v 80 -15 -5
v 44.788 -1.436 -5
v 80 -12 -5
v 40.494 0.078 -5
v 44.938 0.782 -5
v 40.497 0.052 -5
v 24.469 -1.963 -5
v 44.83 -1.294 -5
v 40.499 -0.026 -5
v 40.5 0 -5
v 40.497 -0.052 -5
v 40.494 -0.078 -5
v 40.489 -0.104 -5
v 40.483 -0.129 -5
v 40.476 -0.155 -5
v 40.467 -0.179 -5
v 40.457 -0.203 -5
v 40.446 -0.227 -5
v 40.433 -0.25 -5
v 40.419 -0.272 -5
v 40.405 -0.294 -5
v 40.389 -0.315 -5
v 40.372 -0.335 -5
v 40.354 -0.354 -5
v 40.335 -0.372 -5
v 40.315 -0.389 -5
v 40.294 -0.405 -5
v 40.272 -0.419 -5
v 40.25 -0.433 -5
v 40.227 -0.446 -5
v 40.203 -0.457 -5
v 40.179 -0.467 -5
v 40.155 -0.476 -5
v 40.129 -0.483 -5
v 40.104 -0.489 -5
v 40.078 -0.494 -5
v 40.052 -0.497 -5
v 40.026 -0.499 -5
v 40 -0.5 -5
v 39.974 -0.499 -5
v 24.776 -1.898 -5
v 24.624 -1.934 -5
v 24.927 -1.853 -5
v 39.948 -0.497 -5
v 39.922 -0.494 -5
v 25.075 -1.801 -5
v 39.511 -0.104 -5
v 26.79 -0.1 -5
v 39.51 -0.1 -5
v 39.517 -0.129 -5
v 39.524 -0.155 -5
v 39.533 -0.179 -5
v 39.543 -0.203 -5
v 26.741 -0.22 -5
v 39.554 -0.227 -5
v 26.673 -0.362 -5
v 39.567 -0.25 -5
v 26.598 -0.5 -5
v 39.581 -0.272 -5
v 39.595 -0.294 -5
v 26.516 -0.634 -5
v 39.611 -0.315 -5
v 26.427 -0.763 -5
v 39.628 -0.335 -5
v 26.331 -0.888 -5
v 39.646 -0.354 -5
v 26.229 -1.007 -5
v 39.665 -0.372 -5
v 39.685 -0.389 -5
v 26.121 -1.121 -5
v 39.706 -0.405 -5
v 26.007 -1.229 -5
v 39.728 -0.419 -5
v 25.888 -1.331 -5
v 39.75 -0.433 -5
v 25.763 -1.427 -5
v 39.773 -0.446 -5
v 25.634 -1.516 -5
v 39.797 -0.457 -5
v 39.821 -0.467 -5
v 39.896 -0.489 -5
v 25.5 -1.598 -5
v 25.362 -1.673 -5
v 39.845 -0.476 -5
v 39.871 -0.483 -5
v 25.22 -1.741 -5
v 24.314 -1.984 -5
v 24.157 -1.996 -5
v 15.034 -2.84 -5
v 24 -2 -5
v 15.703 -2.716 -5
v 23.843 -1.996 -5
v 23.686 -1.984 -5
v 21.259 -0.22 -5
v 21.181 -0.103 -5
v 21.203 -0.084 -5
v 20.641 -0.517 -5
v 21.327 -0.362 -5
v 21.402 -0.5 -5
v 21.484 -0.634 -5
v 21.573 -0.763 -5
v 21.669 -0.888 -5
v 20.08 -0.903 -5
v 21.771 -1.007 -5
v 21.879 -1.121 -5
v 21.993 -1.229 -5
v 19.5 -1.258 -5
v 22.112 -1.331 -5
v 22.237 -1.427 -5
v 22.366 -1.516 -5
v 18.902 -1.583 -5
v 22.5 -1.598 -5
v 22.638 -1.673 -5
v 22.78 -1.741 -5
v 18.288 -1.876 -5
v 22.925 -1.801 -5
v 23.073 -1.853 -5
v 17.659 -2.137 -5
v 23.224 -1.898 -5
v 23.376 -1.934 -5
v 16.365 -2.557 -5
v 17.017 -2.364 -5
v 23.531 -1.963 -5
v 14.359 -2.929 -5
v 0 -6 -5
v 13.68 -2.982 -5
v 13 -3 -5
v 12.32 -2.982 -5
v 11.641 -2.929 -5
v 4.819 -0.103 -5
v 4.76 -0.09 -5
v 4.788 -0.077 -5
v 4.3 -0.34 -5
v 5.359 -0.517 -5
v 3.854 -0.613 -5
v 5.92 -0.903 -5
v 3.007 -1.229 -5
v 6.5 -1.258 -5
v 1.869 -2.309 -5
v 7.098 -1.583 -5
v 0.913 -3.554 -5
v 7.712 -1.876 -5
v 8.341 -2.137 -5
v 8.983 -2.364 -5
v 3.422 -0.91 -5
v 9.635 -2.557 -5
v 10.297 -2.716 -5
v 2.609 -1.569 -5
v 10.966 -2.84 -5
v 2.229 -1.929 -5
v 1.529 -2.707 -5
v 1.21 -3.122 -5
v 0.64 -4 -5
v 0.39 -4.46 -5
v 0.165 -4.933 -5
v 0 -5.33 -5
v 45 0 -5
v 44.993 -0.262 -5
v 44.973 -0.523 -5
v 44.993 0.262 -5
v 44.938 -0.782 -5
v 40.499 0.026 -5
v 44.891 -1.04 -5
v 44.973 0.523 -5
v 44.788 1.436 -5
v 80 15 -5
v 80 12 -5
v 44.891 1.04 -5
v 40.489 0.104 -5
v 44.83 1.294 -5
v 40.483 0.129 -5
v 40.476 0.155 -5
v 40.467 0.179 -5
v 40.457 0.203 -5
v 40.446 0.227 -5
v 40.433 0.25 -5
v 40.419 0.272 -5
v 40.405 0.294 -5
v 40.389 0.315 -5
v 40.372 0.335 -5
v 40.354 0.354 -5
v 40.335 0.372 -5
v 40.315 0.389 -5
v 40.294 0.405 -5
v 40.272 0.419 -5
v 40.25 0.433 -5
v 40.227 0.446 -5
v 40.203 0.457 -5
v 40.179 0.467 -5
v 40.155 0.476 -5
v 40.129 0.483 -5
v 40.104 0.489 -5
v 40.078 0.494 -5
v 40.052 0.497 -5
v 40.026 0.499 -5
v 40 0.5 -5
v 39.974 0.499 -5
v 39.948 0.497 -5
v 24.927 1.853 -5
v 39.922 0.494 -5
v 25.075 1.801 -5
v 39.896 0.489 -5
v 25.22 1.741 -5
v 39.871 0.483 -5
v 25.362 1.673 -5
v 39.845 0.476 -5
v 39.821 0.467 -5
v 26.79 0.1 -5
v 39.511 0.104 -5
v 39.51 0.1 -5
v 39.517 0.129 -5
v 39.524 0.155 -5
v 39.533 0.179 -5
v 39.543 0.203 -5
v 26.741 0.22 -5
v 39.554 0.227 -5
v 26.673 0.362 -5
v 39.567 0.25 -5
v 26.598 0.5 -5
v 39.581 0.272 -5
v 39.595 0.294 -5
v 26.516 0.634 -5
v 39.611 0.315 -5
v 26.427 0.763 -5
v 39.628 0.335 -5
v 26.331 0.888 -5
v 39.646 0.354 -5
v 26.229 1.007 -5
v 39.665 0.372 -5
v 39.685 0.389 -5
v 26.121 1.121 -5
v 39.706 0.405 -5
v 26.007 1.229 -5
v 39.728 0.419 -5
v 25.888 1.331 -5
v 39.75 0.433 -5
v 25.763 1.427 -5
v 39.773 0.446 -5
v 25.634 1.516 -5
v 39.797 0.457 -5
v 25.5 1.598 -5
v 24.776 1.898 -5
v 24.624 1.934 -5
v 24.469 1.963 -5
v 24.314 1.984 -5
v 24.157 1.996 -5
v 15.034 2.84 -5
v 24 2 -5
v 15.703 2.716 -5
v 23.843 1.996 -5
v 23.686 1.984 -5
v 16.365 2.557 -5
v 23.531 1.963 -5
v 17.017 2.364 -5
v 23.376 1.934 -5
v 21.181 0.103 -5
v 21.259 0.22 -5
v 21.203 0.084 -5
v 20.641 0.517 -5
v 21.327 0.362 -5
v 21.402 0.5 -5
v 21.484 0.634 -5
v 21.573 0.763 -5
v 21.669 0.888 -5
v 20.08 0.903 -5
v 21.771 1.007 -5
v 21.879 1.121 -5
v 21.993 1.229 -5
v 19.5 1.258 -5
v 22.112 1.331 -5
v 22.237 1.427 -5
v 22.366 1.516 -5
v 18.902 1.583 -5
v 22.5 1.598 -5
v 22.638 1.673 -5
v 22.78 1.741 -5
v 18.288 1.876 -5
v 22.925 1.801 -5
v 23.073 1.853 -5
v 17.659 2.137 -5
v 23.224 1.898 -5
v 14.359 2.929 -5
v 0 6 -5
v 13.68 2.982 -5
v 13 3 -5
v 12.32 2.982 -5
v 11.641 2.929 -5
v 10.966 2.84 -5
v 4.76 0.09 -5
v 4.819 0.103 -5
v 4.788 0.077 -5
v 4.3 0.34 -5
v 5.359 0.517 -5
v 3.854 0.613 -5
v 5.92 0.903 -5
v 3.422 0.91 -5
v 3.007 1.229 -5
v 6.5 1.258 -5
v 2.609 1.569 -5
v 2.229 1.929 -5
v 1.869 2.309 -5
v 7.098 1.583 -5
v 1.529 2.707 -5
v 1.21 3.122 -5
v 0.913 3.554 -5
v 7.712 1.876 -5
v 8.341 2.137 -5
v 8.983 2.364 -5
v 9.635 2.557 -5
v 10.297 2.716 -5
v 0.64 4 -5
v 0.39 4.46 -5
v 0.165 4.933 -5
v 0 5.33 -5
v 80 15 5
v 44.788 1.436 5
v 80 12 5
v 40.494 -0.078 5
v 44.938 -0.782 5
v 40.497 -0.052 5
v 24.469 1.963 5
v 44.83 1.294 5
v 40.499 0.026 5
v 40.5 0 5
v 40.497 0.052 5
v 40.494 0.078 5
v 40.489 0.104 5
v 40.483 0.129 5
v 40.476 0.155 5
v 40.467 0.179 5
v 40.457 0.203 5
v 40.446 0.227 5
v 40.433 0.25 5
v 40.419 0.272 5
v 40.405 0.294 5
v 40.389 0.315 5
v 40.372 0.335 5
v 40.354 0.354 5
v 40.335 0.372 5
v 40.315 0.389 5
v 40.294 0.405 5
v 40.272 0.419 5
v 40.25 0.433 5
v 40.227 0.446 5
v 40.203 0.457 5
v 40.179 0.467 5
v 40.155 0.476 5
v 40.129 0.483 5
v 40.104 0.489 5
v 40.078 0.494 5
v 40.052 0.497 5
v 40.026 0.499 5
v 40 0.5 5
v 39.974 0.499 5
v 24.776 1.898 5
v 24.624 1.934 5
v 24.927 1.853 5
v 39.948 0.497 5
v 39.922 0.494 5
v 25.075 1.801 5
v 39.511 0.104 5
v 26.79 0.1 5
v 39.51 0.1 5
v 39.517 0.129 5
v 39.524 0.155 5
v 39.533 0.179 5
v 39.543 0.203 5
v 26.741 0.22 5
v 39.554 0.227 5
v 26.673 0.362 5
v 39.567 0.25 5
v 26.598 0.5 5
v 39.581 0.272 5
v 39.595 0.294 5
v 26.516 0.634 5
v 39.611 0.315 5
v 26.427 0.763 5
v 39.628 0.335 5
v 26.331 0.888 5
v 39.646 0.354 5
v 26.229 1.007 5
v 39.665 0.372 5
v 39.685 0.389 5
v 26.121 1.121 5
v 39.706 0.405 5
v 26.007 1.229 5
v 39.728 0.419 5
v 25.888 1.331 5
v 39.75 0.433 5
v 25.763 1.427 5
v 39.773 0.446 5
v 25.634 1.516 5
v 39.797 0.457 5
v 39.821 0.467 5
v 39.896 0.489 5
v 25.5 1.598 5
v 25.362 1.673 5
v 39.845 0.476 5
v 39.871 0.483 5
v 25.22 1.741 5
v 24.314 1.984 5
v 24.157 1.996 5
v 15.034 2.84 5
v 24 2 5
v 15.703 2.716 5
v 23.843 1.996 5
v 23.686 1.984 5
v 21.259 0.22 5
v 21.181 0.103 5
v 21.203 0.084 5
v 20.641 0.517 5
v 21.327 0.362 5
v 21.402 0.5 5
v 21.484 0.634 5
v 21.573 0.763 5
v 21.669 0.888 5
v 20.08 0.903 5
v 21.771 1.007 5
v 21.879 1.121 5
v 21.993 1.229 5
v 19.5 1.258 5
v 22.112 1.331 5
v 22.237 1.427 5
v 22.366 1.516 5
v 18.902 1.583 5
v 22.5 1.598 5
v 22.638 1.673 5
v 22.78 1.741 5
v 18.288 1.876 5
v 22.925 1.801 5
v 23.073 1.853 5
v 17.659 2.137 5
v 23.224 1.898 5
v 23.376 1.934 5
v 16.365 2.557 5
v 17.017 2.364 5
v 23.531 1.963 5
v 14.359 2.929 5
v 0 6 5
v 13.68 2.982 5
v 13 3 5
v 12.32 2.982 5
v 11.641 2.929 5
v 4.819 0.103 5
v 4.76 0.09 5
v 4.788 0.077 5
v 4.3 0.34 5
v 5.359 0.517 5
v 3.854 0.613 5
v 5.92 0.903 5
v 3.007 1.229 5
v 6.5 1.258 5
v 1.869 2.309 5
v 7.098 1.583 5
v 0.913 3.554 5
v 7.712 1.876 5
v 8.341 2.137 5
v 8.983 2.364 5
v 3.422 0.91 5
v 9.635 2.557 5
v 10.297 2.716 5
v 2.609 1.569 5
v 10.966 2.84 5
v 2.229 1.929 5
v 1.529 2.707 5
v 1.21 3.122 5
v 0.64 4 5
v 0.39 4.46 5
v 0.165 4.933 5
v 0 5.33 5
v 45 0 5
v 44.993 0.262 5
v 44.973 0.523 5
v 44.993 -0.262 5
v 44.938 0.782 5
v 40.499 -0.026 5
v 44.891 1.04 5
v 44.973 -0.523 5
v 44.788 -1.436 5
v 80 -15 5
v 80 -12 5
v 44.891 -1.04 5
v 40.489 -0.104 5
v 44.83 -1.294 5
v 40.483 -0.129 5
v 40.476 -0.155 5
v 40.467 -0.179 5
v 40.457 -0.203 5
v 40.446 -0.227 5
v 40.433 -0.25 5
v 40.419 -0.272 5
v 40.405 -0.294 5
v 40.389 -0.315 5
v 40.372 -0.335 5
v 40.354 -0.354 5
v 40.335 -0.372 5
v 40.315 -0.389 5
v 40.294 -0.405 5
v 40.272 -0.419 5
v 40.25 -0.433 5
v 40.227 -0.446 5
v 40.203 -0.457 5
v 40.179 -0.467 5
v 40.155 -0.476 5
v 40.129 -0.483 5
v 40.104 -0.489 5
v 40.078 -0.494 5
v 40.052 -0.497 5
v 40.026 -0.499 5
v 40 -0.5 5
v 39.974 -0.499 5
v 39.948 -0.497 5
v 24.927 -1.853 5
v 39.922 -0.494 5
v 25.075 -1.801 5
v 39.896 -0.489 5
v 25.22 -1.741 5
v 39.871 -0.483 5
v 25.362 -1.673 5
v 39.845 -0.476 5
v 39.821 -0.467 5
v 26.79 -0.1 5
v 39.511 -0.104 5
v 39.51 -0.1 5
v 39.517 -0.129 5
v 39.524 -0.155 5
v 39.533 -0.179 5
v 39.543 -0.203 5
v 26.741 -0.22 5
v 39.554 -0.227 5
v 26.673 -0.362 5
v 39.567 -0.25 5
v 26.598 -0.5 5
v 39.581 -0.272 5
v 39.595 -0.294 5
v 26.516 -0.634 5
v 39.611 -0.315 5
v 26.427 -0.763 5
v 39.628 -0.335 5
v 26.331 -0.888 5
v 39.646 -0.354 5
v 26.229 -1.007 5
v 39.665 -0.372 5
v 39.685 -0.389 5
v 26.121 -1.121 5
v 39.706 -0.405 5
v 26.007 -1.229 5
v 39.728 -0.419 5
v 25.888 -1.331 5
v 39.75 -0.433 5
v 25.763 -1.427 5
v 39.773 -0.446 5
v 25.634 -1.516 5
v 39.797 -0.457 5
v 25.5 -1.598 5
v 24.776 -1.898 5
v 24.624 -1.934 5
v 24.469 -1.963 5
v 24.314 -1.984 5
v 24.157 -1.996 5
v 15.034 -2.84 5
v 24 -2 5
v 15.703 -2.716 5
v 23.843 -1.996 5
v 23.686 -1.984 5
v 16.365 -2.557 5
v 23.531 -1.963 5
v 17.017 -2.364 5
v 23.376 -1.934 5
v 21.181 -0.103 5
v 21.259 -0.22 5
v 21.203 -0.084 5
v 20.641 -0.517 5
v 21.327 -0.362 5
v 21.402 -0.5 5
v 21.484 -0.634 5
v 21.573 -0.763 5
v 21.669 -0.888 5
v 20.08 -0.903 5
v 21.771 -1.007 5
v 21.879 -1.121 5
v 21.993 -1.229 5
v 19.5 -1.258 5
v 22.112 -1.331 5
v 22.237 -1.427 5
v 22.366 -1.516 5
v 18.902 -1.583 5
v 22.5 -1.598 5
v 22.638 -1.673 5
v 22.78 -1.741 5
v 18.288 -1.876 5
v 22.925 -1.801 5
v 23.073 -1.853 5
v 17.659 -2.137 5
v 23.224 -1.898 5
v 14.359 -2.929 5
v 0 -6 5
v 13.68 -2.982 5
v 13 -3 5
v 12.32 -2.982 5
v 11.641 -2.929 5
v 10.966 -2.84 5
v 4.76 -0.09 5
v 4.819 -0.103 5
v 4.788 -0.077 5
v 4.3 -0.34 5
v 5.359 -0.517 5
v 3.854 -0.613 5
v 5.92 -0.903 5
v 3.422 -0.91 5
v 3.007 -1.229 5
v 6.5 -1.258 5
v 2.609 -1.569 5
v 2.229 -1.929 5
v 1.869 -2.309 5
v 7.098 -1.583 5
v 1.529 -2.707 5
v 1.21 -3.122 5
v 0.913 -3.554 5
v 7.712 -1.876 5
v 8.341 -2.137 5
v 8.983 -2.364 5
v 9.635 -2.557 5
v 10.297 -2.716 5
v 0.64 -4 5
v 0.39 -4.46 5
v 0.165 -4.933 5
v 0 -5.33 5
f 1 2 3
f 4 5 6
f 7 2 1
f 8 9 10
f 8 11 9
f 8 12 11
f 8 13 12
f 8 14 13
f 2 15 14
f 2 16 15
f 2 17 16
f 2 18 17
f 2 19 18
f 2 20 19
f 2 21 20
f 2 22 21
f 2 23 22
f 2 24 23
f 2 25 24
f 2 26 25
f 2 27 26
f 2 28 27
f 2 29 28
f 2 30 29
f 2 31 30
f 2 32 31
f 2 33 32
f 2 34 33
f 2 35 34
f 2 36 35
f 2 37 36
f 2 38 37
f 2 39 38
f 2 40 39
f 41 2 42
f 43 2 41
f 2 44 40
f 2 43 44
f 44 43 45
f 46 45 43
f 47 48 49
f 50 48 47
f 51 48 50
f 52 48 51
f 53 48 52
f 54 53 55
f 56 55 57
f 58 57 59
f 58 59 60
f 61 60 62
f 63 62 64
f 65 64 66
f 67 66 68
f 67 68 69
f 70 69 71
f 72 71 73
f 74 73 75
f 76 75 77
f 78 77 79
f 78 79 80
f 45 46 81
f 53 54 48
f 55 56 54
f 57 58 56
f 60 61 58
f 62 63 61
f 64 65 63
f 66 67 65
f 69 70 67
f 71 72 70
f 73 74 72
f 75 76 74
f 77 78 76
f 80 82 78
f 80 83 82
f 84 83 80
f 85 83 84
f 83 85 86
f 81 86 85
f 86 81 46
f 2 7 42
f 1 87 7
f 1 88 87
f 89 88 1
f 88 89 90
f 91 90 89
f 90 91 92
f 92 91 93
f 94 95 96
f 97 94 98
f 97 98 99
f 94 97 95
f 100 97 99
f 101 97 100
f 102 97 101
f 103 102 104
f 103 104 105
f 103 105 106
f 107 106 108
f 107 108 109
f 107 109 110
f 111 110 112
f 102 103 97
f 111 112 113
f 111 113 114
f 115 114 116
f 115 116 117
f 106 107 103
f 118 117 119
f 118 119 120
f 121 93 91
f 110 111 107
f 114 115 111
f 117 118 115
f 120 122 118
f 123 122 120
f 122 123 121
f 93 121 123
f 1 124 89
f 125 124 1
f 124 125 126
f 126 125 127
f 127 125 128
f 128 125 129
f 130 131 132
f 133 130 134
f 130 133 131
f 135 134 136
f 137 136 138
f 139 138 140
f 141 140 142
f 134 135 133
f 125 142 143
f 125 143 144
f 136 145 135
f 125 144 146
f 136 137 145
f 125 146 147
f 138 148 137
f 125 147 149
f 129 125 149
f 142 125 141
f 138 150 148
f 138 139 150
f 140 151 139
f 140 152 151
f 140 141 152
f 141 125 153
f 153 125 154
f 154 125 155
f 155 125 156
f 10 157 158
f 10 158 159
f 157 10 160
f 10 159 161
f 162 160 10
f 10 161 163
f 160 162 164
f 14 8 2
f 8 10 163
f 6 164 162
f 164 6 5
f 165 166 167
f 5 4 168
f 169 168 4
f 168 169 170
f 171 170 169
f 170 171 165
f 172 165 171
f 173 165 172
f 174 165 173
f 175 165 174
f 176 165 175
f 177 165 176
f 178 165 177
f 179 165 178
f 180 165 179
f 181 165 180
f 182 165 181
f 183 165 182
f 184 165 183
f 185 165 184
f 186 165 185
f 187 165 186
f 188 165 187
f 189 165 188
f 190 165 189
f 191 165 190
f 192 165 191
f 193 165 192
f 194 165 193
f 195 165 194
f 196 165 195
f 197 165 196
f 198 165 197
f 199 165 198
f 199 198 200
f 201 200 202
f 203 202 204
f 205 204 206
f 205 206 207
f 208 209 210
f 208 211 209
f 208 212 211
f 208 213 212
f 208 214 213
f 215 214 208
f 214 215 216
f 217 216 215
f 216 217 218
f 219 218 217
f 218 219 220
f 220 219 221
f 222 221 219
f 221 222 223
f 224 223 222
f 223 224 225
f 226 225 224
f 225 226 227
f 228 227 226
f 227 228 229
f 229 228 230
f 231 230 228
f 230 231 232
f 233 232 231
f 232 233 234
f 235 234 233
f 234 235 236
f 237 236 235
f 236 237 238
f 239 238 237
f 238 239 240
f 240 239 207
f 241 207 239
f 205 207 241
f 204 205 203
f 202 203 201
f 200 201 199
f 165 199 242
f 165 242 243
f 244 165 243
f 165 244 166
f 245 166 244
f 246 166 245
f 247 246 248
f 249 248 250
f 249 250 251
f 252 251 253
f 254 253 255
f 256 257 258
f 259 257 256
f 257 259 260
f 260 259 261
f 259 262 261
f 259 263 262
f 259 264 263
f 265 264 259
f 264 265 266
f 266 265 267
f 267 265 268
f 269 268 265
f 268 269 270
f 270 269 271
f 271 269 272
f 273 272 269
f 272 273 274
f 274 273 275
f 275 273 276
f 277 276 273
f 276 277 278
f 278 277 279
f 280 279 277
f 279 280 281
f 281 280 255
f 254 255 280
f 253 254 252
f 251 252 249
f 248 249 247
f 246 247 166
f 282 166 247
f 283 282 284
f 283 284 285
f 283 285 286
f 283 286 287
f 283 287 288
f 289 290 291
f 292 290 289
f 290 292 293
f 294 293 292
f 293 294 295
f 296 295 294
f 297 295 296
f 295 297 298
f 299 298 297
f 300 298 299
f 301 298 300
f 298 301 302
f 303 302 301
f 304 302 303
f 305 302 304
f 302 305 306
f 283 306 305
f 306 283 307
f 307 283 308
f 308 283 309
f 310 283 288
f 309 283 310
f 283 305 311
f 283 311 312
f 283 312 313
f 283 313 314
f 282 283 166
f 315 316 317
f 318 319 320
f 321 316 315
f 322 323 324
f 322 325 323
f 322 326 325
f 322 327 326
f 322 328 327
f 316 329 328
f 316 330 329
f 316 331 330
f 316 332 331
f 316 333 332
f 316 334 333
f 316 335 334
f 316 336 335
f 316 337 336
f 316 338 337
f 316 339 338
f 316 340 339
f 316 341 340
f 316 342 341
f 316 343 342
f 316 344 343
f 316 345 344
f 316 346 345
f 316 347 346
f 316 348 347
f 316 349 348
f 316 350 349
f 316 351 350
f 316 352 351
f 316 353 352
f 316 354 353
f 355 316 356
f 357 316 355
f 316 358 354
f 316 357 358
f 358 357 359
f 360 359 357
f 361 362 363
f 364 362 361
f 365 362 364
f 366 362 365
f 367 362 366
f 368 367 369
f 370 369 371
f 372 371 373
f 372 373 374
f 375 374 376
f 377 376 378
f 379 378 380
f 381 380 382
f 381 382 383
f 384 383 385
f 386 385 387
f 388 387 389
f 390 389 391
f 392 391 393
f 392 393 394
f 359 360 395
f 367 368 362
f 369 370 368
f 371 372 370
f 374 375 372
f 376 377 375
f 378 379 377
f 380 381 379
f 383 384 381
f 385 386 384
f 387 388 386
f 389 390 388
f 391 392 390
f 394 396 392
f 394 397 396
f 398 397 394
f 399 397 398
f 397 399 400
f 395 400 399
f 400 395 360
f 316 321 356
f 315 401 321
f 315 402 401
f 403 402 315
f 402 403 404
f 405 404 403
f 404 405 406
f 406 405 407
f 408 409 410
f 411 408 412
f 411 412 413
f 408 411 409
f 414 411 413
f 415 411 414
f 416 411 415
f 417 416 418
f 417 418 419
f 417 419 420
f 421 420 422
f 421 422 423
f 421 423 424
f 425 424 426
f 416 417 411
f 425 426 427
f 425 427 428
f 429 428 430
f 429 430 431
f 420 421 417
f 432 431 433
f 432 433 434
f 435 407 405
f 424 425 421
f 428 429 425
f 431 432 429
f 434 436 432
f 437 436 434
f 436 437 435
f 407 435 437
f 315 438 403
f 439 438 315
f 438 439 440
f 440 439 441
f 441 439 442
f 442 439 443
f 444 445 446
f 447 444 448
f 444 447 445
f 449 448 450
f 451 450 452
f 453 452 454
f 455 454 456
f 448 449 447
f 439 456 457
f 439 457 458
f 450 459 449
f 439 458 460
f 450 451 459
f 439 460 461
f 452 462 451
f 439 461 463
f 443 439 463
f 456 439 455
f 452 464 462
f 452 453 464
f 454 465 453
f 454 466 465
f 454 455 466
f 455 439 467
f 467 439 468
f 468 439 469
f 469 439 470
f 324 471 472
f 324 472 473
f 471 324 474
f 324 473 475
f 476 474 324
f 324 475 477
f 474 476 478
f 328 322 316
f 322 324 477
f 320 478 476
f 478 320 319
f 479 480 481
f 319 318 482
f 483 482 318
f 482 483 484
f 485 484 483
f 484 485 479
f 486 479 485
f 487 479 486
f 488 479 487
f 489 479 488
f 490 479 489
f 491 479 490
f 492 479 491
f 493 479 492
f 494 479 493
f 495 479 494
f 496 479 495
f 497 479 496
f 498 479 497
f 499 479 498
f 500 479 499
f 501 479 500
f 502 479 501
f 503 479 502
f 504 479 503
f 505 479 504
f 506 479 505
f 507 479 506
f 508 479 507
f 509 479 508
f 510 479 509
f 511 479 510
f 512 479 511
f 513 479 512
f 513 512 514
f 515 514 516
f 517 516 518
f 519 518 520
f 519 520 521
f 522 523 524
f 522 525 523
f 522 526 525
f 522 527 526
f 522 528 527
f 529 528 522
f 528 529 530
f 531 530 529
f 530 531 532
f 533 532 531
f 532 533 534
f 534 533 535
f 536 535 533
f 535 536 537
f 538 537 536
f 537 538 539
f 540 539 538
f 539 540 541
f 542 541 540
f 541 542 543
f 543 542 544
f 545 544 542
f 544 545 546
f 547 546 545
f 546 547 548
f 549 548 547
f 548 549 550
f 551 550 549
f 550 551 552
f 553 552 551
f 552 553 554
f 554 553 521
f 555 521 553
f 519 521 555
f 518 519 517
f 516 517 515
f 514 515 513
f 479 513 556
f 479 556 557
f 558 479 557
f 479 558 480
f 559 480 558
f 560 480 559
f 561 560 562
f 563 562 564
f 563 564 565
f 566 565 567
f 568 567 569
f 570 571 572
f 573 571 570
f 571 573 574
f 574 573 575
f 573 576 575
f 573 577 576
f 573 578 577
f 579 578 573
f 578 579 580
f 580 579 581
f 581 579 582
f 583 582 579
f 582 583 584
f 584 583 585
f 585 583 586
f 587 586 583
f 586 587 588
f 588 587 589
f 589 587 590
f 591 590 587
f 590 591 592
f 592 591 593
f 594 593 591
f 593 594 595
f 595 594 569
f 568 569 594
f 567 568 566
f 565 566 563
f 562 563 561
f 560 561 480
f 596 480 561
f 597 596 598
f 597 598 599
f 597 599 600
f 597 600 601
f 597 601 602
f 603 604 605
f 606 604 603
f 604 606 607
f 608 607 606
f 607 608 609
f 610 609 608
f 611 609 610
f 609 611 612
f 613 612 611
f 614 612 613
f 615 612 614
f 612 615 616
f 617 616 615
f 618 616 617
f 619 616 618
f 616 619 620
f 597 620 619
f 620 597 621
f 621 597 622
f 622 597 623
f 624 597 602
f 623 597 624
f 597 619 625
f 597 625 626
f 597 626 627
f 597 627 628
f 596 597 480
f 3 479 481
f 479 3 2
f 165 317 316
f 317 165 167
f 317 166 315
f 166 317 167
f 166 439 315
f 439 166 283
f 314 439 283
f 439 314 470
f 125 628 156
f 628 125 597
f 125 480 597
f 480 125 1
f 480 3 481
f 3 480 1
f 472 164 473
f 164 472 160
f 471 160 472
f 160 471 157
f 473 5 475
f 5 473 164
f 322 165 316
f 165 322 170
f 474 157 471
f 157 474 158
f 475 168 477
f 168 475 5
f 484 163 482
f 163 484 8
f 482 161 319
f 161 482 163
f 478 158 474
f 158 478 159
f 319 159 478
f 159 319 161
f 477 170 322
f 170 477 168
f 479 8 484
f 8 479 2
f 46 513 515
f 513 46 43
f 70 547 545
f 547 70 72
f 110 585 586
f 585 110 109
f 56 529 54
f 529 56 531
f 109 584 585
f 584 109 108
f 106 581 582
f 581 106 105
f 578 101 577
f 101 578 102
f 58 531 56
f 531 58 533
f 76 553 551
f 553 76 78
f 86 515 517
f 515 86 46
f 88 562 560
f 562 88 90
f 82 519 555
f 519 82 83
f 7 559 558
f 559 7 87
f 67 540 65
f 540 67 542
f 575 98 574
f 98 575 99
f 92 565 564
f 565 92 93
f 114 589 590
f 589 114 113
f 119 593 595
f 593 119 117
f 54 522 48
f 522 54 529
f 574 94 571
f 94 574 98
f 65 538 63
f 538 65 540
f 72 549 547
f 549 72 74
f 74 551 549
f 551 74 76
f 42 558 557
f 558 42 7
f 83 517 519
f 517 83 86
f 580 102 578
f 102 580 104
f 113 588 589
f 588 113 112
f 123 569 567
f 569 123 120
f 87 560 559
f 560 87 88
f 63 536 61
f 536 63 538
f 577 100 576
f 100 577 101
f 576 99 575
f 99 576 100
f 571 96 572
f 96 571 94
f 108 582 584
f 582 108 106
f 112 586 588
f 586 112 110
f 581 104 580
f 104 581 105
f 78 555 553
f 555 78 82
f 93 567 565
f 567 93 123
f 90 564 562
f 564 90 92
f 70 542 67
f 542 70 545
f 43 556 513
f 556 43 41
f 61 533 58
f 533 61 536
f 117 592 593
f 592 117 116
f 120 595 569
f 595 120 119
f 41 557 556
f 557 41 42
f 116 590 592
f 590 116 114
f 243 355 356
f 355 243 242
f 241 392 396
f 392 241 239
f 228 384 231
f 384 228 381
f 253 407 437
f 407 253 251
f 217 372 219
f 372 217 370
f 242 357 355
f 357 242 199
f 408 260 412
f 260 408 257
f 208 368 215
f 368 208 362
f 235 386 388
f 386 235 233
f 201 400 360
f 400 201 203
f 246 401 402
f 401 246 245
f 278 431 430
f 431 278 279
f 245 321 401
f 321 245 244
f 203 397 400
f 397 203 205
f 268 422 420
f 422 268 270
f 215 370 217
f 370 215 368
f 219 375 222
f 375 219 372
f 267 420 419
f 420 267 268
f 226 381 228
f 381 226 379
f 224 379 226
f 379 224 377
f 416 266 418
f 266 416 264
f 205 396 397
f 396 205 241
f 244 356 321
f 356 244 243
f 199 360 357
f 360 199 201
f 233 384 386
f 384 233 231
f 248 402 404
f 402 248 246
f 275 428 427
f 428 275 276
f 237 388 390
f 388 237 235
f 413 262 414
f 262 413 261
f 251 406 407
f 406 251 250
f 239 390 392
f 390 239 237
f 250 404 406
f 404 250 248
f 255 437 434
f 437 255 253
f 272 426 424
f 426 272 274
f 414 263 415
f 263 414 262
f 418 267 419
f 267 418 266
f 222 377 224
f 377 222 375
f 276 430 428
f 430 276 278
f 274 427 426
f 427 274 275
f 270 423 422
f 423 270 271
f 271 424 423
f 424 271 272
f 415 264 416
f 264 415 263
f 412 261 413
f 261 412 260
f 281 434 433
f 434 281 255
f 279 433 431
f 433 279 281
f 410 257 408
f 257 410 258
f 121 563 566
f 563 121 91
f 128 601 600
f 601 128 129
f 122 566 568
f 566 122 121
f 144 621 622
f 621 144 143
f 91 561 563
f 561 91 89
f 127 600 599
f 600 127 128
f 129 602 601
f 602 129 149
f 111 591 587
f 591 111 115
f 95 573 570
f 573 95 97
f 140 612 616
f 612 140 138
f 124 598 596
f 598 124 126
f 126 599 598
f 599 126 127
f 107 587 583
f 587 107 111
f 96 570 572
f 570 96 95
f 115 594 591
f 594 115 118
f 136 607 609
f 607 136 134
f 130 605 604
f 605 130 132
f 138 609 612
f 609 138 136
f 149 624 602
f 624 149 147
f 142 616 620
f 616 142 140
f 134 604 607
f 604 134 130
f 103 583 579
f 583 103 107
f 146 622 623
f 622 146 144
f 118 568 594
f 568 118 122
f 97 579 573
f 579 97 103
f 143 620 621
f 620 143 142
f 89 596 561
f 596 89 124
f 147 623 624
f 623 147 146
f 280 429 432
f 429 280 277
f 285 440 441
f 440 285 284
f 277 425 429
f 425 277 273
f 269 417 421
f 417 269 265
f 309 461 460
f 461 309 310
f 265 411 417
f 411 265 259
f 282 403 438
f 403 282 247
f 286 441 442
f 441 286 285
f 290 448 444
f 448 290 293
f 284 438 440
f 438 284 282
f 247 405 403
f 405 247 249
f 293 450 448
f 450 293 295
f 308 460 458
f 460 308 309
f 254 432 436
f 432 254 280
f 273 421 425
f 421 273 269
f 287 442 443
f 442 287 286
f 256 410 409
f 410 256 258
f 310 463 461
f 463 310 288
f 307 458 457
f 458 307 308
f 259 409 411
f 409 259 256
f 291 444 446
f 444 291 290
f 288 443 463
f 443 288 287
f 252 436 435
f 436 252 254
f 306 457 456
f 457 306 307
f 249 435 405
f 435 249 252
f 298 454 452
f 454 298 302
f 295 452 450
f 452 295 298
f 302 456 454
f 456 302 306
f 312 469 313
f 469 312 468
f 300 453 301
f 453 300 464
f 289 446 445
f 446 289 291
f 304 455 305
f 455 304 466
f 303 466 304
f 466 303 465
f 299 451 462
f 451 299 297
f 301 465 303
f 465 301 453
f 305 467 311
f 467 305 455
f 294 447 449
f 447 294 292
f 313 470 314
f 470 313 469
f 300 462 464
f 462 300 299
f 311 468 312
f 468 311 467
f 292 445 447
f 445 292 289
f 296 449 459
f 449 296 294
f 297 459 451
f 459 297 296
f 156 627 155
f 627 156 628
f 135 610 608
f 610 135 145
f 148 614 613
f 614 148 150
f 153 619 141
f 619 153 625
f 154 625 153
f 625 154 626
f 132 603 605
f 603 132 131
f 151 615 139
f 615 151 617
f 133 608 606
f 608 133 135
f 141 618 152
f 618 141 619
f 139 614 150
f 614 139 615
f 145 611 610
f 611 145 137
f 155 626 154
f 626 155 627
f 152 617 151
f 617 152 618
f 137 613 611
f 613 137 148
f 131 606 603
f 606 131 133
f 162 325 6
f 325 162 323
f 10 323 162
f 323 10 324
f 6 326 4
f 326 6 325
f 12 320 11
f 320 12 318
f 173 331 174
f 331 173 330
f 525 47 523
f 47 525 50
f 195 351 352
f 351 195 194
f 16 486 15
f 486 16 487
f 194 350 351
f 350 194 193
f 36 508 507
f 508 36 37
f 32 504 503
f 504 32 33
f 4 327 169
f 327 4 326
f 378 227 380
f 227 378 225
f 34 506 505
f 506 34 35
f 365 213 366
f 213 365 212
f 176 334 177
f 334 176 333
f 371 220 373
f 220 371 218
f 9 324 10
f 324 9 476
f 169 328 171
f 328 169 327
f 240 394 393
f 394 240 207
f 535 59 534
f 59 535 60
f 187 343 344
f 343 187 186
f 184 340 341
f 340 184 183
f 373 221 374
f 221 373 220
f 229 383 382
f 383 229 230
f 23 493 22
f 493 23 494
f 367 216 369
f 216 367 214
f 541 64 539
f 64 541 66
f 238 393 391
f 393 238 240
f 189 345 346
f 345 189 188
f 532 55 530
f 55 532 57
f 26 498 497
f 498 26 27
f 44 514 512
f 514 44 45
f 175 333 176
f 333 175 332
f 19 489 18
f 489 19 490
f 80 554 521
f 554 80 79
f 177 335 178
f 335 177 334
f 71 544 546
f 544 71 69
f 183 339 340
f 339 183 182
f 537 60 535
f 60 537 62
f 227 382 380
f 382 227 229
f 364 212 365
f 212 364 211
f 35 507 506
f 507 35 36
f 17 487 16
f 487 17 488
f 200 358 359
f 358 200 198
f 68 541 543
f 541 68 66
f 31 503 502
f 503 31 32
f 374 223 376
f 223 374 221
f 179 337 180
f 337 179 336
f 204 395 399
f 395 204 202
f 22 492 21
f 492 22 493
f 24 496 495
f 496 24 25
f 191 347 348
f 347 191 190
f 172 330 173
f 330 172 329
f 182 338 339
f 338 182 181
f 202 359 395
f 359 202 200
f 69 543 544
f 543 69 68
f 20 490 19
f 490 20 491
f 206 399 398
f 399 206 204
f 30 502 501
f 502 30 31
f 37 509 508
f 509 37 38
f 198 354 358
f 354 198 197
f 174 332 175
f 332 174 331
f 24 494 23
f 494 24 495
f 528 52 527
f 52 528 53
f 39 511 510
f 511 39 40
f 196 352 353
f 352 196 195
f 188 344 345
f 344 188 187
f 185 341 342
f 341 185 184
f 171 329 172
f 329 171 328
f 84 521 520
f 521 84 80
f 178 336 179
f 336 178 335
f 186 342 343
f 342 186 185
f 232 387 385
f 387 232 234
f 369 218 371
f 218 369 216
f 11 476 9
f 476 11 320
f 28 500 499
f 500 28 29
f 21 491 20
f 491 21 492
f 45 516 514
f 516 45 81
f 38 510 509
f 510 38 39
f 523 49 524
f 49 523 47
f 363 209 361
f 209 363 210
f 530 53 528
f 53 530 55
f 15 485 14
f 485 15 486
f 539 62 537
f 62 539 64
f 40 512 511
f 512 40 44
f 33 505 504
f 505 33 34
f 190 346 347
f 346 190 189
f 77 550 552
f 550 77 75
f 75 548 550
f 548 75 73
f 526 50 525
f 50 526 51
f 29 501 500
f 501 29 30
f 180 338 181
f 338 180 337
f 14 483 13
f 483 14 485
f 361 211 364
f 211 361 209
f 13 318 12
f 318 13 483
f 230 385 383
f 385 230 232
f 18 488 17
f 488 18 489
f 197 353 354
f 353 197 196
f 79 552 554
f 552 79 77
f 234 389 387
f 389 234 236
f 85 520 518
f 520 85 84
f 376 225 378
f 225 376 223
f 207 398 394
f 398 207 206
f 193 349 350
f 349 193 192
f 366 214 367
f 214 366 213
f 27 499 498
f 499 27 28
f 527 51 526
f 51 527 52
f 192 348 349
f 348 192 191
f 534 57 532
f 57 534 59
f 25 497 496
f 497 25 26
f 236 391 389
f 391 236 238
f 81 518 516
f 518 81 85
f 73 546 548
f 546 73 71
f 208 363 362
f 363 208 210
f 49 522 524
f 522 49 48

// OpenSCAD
/* * * * * * * * * * * * * * * * * * * * * * * * * * * * * * * * * * * * *\
 * Copyright (C) Claus Schrammel <claus@f05fk.net>                       *
 *                                                                       *
 * This program is free software: you can redistribute it and/or modify  *
 * it under the terms of the GNU General Public License as published by  *
 * the Free Software Foundation, either version 3 of the License, or     *
 * (at your option) any later version.                                   *
 *                                                                       *
 * This program is distributed in the hope that it will be useful,       *
 * but WITHOUT ANY WARRANTY; without even the implied warranty of        *
 * MERCHANTABILITY or FITNESS FOR A PARTICULAR PURPOSE.  See the         *
 * GNU General Public License for more details.                          *
 *                                                                       *
 * You should have received a copy of the GNU General Public License     *
 * along with this program.  If not, see <http://www.gnu.org/licenses/>. *
 *                                                                       *
 * SPDX-License-Identifier: GPL-3.0-or-later                             *
\* * * * * * * * * * * * * * * * * * * * * * * * * * * * * * * * * * * * */
$fn = 120;

// does not work properly

difference() {
    union() {
        linear_extrude(10, center = true, convexity = 10)
        polygon([ [0, 6], [80, 15], [80, 12], [40, 0], [80, -12], [80, -15], [0, -6]]);

        translate([40, 0, 0]) cylinder(h = 10, d = 10, center = true);
    }

    translate([40, 0, 0]) cylinder(h = 12, d = 1, center = true);

    translate([32, 0, 0]) cube([16, 0.2, 12], center = true);

    translate([24, 0, 0])
    intersection() {
        translate([0, 1, 0]) cylinder(h = 12, d = 6, center = true);
        translate([0, -1, 0]) cylinder(h = 12, d = 6, center = true);
    }

    translate([13, 0, 0])
    intersection() {
        translate([0, 10, 0]) cylinder(h = 12, d = 26, center = true);
        translate([0, -10, 0]) cylinder(h = 12, d = 26, center = true);
    }

    difference() {
        cube([20, 20, 12], center = true);
        translate([9.3, 9, 0]) cylinder(h = 14, d = 20, center = true);
        translate([9.3, -9, 0]) cylinder(h = 14, d = 20, center = true);
    }

}
